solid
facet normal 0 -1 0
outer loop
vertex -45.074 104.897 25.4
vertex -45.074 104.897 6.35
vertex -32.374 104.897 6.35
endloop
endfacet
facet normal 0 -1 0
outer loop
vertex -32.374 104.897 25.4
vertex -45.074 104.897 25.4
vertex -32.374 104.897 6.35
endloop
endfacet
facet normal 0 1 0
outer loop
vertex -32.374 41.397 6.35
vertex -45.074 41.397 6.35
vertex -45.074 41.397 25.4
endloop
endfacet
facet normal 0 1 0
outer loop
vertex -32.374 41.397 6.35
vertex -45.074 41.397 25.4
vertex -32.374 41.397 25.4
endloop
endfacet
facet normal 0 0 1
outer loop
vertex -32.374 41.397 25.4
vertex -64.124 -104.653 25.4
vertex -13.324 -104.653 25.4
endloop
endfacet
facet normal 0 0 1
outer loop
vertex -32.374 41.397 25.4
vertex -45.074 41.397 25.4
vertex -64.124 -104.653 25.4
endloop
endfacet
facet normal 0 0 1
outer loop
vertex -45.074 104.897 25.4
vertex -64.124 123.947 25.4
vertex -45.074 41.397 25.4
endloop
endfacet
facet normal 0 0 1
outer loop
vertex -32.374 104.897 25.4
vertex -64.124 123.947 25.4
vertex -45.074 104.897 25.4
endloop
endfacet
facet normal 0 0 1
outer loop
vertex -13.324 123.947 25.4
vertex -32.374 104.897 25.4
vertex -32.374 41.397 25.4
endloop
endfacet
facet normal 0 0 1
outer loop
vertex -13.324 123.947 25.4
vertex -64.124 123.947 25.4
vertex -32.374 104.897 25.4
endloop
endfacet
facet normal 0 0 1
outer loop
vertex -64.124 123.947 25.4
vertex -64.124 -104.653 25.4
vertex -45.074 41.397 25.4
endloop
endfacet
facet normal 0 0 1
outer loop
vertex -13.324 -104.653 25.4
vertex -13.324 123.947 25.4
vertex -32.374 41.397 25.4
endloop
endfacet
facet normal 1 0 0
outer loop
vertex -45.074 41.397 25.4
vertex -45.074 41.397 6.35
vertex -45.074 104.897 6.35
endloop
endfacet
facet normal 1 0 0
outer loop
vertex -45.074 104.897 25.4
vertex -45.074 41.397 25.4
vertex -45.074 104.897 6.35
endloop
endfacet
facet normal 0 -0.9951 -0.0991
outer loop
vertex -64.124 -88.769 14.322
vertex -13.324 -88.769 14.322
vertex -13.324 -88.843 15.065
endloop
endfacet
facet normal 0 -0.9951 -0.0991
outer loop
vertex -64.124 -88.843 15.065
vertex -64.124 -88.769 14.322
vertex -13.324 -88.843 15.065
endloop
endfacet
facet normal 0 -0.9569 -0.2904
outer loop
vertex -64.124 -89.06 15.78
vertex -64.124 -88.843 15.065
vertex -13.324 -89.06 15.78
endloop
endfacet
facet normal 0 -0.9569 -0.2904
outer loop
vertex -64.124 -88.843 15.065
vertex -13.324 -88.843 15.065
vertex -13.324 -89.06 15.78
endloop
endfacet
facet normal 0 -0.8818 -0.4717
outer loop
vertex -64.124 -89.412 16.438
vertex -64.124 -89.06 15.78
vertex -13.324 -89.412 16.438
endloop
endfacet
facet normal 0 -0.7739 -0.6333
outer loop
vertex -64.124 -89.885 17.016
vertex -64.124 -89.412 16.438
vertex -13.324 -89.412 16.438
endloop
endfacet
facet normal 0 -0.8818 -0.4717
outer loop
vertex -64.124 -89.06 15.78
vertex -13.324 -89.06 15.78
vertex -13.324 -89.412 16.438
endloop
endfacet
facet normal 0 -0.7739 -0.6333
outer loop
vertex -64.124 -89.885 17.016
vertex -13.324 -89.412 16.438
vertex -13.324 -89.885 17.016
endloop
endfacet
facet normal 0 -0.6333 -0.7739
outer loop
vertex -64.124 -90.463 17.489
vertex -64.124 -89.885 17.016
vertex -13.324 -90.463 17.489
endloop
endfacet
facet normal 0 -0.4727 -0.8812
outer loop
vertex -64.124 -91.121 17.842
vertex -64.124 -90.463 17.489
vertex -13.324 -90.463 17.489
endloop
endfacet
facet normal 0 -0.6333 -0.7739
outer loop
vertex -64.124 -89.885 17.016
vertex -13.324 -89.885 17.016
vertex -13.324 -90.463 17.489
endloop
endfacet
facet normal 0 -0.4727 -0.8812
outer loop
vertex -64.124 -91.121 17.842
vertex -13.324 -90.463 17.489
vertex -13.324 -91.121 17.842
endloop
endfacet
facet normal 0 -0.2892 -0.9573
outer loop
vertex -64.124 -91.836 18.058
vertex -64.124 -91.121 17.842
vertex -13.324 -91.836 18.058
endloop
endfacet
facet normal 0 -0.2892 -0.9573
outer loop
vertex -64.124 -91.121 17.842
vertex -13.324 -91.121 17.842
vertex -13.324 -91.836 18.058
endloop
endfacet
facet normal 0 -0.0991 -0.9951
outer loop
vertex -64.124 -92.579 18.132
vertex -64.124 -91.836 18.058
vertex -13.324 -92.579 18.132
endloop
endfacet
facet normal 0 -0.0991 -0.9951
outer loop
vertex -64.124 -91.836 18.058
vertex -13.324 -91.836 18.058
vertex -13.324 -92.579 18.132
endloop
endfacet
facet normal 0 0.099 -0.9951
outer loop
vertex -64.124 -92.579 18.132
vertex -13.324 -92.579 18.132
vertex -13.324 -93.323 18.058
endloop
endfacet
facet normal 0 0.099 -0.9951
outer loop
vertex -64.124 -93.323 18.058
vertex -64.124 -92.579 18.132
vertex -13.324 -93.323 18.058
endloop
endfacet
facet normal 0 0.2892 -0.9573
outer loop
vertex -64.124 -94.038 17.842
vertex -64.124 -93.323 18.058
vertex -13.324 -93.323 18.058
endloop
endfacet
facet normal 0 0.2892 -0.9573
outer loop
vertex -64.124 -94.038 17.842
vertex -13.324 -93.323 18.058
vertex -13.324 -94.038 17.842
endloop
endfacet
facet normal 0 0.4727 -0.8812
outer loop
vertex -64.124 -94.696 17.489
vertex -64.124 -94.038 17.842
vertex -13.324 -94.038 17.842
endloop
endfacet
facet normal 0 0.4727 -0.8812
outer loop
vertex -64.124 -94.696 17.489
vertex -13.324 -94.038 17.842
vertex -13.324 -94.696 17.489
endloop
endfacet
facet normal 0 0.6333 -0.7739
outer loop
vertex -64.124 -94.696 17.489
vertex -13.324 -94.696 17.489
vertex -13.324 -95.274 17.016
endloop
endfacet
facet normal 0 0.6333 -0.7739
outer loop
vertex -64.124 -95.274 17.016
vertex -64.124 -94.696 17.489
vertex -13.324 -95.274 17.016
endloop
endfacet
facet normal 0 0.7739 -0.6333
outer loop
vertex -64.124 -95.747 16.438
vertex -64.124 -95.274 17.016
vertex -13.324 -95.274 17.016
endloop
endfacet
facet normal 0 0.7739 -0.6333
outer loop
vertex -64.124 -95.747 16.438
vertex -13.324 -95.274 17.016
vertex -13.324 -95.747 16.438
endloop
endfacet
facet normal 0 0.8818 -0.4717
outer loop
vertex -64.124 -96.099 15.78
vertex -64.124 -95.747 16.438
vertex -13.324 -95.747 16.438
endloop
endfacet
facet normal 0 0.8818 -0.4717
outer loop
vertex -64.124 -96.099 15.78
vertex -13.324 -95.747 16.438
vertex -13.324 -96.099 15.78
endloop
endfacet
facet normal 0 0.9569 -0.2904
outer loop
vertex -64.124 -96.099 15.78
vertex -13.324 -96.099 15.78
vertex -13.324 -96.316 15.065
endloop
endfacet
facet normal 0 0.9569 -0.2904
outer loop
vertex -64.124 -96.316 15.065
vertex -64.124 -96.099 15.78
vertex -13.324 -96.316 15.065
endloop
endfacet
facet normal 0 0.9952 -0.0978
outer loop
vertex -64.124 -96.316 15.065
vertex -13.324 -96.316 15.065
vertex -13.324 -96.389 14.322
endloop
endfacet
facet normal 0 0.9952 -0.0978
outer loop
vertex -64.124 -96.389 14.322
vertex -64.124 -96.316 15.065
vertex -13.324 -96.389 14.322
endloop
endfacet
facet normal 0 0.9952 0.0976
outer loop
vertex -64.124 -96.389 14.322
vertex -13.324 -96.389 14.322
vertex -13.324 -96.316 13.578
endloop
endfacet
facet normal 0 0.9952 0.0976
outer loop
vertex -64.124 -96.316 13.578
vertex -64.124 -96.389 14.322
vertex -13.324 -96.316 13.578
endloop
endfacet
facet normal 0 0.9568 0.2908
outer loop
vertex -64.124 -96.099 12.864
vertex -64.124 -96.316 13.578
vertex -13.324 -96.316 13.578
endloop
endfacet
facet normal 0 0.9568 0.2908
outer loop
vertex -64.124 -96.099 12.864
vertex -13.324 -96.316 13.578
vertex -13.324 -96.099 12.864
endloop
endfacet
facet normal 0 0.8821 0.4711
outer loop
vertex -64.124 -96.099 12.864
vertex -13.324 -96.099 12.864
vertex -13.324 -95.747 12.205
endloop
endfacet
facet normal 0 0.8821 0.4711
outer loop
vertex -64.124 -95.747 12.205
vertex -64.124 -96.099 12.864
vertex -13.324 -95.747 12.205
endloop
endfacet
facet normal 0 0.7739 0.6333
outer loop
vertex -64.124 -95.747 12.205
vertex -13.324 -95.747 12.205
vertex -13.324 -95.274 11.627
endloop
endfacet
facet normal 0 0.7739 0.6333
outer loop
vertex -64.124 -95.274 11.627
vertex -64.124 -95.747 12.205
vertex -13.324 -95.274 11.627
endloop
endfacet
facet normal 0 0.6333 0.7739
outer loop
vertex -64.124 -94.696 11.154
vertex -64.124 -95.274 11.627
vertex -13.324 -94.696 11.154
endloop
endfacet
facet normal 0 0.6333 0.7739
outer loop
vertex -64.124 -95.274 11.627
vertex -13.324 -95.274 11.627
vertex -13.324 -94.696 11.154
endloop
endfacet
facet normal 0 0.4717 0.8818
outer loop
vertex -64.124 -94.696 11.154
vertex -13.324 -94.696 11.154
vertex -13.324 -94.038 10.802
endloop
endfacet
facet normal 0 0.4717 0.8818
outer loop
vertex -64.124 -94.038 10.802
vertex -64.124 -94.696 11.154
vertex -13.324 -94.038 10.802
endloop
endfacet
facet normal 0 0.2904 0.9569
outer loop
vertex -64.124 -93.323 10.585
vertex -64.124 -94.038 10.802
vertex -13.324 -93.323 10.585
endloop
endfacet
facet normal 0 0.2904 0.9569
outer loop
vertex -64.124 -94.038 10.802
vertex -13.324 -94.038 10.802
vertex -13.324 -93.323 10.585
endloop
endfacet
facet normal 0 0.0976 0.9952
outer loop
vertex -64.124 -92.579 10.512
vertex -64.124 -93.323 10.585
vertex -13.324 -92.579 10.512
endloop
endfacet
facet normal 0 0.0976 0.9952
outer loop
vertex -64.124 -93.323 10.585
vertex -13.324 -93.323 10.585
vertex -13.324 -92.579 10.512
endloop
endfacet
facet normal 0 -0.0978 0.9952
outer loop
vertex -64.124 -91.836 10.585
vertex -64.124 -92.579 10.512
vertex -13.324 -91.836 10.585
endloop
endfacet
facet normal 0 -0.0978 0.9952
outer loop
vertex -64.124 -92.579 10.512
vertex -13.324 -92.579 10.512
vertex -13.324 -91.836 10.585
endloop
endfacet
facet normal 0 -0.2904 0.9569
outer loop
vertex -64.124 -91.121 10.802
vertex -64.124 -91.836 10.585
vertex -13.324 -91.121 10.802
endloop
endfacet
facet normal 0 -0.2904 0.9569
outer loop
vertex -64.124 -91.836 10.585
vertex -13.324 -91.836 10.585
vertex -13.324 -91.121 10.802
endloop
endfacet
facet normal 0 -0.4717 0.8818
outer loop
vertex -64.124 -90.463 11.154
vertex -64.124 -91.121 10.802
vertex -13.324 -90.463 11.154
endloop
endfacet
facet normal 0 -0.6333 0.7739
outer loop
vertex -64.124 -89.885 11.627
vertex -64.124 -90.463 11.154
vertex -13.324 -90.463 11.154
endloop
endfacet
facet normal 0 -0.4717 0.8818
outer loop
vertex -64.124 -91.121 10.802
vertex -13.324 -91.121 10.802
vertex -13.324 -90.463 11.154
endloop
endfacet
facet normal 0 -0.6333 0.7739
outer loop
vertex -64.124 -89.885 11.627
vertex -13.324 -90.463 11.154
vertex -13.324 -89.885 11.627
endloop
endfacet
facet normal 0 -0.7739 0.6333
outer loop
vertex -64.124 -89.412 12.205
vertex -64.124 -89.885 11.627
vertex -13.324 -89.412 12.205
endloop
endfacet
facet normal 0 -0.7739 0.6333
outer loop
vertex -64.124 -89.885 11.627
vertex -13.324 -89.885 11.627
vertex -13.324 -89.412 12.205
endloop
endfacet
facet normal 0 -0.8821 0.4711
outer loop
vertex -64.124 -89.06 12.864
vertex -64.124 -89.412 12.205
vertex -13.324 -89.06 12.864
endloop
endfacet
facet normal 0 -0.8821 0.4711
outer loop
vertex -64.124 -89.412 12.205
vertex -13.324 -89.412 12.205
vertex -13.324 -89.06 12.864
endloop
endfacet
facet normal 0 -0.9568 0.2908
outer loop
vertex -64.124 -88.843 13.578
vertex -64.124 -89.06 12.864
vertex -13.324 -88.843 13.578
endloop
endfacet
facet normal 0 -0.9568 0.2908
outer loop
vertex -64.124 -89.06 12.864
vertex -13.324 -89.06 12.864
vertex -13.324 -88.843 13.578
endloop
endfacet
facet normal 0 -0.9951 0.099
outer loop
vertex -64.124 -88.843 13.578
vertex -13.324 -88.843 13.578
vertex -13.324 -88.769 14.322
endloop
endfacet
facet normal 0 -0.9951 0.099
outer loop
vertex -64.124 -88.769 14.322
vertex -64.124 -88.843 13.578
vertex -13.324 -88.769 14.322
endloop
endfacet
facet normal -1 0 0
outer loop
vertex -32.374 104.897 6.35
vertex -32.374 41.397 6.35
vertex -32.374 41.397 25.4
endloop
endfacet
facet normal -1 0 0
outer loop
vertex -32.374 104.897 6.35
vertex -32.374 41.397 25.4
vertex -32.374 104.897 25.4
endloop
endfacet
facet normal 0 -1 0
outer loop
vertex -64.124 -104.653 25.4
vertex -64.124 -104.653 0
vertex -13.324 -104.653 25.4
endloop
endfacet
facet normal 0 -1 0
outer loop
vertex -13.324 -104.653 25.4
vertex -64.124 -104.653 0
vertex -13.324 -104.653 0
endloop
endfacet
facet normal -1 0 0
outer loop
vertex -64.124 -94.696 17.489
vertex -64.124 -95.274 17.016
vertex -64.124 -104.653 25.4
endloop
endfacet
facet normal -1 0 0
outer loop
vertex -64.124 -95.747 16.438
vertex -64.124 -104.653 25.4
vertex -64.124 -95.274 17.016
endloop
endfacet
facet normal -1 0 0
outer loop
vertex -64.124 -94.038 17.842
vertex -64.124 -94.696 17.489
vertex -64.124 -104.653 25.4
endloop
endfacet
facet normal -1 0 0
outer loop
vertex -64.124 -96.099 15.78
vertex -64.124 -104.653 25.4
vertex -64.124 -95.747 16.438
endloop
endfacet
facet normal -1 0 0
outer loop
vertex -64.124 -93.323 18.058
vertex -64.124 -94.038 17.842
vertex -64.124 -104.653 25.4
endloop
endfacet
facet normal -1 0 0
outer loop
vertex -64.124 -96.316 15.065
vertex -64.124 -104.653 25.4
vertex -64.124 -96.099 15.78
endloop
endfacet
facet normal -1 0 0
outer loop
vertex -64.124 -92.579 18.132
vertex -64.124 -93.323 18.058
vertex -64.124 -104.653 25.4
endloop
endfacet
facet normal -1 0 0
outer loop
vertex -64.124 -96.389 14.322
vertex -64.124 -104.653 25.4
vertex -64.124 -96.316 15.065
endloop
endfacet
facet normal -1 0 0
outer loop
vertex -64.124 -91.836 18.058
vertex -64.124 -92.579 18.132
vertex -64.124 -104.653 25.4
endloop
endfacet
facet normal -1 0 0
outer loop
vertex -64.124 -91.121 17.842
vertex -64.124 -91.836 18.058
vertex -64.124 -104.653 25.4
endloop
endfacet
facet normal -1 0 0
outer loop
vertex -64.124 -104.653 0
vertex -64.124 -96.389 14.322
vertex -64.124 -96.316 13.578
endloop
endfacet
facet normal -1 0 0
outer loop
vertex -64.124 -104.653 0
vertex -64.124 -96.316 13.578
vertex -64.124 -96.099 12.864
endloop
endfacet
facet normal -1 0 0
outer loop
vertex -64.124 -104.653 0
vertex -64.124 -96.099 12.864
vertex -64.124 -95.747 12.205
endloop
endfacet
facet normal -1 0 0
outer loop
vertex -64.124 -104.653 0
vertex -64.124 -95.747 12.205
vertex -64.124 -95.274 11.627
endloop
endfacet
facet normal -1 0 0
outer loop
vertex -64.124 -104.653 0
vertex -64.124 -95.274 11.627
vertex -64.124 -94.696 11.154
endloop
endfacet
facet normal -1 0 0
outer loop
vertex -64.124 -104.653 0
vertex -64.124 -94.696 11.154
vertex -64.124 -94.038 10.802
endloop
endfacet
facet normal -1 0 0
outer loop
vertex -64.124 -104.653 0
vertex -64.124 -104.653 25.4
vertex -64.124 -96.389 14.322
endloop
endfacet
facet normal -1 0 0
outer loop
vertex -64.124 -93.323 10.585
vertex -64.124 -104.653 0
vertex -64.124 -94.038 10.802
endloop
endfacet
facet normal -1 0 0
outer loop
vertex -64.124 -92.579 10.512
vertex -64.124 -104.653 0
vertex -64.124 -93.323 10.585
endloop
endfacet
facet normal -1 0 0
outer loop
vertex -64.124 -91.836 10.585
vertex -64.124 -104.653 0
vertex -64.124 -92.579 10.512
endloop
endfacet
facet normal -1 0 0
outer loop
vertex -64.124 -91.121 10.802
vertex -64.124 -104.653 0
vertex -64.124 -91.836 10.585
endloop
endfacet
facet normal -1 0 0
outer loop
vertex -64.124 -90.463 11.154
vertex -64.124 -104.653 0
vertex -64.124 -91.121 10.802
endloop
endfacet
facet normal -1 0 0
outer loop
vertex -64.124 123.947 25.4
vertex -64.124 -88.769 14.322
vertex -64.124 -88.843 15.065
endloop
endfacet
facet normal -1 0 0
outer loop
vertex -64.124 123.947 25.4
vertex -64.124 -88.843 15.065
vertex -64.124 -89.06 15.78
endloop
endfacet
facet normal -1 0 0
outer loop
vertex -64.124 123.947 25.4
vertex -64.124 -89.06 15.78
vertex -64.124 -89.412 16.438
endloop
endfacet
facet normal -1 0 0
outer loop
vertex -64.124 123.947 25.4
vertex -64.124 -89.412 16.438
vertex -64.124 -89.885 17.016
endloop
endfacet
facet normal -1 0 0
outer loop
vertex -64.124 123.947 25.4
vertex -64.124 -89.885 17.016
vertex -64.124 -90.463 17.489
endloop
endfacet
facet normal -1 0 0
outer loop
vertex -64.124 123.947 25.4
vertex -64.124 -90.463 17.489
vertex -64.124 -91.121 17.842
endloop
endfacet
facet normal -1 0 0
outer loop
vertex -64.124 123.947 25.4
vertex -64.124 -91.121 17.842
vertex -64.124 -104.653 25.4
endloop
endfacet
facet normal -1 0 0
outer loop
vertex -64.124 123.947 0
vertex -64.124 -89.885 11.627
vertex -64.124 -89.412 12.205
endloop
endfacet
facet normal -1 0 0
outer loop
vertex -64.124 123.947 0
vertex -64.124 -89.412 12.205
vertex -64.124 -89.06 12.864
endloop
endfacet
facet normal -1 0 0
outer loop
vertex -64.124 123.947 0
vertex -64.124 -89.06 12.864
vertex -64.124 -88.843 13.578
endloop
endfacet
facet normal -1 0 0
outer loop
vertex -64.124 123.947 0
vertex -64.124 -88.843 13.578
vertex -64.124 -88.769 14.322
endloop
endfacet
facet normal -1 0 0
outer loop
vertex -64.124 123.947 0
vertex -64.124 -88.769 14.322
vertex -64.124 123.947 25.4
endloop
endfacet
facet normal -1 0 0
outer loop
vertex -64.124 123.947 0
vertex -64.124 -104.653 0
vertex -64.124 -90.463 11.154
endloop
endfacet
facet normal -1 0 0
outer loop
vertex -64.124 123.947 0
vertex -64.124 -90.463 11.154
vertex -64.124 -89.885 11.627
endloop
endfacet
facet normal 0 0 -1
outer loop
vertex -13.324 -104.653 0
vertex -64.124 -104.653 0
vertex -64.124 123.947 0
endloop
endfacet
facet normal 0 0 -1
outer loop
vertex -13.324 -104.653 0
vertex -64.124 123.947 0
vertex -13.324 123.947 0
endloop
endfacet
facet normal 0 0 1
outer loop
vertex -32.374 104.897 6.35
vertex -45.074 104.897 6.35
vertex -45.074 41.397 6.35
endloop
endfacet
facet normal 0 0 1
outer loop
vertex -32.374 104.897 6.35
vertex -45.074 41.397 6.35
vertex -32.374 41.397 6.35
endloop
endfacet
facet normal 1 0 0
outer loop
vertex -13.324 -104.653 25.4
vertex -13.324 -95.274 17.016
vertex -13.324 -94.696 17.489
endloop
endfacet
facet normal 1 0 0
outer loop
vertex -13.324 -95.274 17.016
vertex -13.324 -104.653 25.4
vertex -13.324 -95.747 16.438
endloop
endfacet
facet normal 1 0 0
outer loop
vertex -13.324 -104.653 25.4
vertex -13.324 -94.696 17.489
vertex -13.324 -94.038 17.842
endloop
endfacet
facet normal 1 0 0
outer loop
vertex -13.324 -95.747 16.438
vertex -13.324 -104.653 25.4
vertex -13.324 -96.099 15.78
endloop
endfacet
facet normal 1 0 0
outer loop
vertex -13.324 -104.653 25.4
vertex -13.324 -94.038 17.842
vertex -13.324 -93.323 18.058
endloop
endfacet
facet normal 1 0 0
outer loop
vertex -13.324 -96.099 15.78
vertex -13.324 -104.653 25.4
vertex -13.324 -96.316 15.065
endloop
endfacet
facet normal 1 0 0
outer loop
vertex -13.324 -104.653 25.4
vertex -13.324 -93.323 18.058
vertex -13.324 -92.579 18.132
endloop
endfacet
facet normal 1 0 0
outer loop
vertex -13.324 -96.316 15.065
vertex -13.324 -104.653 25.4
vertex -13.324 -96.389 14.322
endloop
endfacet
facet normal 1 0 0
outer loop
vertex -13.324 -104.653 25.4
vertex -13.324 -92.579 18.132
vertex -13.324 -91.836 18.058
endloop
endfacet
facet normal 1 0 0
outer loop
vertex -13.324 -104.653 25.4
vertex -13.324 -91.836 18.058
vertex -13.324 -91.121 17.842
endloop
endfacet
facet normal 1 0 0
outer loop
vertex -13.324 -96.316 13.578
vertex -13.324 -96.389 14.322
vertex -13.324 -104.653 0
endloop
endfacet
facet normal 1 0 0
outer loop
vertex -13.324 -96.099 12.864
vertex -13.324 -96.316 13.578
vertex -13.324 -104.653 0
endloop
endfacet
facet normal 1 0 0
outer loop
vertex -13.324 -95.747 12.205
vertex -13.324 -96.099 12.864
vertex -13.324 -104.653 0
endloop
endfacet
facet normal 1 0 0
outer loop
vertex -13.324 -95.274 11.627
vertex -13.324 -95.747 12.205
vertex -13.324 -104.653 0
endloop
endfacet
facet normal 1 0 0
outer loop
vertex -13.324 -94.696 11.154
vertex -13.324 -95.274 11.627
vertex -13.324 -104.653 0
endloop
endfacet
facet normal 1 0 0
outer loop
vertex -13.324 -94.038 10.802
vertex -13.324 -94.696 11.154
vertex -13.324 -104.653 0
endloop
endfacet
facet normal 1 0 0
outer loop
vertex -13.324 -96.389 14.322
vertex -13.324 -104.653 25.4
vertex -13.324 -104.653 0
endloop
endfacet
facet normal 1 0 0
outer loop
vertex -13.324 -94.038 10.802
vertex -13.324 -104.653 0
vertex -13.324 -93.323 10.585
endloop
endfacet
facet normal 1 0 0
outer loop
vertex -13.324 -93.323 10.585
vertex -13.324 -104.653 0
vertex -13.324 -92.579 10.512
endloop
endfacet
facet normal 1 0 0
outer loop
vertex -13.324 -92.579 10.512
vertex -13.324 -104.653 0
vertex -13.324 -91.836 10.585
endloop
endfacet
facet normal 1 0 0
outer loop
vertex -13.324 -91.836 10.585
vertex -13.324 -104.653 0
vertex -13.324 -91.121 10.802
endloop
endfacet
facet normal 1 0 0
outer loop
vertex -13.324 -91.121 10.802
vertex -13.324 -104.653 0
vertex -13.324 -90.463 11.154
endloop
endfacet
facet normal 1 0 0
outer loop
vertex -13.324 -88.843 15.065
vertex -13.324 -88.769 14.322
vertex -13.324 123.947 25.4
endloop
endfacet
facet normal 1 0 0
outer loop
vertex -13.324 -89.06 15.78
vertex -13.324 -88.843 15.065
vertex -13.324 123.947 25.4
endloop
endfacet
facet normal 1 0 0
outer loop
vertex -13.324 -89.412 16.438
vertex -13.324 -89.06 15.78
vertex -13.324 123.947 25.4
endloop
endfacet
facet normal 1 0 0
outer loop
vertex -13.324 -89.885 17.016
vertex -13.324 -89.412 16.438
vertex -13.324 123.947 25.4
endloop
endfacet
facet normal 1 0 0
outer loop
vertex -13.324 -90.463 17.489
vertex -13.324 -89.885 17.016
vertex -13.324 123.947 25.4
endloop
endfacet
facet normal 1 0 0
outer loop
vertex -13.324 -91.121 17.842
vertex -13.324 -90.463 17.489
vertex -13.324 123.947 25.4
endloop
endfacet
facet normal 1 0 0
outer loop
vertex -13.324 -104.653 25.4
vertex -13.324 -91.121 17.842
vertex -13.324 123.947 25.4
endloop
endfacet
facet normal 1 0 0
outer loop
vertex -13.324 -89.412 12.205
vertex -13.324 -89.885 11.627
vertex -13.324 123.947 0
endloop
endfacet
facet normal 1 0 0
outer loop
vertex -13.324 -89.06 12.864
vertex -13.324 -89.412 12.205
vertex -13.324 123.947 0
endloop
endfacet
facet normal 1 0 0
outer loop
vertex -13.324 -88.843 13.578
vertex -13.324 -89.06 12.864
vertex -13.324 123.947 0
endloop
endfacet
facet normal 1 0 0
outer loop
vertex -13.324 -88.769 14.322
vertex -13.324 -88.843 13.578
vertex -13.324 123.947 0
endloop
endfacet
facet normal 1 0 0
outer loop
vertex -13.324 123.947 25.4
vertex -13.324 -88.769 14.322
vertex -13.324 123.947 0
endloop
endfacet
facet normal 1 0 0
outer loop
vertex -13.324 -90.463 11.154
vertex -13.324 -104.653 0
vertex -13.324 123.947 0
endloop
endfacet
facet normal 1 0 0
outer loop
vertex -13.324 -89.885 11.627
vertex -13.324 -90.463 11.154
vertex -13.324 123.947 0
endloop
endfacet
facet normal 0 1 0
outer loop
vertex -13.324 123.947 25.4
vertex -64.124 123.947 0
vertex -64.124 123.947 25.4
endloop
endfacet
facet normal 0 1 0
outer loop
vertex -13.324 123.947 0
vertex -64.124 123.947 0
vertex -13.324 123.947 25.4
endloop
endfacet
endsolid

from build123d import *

# Parameters (mm, degrees)
F0_W     = 12.7
F0_H     = 63.5
F1_DEPTH = 6.35
F0_W_2   = 50.8
F0_H_2   = 228.6
F2_DEPTH = 25.4
F4_D     = 7.62


with BuildPart() as f1:
    # F0 (on Top) → F1 (new body)
    with BuildSketch(Plane.XY):
        with Locations((-38.724346, 73.146781)):
            Rectangle(F0_W, F0_H)
    extrude(amount=F1_DEPTH)

    # F0 (on Top) → F2 (join)
    with BuildSketch(Plane.XY):
        with Locations((-38.724346, 9.646781)):
            Rectangle(F0_W_2, F0_H_2)
        with Locations((-38.724346, 73.146781)):
            Rectangle(F0_W, F0_H, mode=Mode.SUBTRACT)
    extrude(amount=F2_DEPTH)

    # F4 (through all)
    with Locations(Plane(origin=(-64.124346, 0, 0), x_dir=(0, -1, 0), z_dir=(-1, 0, 0))):
        with Locations((92.579484, 14.321566)):
            Hole(F4_D / 2)


solid = f1.part
